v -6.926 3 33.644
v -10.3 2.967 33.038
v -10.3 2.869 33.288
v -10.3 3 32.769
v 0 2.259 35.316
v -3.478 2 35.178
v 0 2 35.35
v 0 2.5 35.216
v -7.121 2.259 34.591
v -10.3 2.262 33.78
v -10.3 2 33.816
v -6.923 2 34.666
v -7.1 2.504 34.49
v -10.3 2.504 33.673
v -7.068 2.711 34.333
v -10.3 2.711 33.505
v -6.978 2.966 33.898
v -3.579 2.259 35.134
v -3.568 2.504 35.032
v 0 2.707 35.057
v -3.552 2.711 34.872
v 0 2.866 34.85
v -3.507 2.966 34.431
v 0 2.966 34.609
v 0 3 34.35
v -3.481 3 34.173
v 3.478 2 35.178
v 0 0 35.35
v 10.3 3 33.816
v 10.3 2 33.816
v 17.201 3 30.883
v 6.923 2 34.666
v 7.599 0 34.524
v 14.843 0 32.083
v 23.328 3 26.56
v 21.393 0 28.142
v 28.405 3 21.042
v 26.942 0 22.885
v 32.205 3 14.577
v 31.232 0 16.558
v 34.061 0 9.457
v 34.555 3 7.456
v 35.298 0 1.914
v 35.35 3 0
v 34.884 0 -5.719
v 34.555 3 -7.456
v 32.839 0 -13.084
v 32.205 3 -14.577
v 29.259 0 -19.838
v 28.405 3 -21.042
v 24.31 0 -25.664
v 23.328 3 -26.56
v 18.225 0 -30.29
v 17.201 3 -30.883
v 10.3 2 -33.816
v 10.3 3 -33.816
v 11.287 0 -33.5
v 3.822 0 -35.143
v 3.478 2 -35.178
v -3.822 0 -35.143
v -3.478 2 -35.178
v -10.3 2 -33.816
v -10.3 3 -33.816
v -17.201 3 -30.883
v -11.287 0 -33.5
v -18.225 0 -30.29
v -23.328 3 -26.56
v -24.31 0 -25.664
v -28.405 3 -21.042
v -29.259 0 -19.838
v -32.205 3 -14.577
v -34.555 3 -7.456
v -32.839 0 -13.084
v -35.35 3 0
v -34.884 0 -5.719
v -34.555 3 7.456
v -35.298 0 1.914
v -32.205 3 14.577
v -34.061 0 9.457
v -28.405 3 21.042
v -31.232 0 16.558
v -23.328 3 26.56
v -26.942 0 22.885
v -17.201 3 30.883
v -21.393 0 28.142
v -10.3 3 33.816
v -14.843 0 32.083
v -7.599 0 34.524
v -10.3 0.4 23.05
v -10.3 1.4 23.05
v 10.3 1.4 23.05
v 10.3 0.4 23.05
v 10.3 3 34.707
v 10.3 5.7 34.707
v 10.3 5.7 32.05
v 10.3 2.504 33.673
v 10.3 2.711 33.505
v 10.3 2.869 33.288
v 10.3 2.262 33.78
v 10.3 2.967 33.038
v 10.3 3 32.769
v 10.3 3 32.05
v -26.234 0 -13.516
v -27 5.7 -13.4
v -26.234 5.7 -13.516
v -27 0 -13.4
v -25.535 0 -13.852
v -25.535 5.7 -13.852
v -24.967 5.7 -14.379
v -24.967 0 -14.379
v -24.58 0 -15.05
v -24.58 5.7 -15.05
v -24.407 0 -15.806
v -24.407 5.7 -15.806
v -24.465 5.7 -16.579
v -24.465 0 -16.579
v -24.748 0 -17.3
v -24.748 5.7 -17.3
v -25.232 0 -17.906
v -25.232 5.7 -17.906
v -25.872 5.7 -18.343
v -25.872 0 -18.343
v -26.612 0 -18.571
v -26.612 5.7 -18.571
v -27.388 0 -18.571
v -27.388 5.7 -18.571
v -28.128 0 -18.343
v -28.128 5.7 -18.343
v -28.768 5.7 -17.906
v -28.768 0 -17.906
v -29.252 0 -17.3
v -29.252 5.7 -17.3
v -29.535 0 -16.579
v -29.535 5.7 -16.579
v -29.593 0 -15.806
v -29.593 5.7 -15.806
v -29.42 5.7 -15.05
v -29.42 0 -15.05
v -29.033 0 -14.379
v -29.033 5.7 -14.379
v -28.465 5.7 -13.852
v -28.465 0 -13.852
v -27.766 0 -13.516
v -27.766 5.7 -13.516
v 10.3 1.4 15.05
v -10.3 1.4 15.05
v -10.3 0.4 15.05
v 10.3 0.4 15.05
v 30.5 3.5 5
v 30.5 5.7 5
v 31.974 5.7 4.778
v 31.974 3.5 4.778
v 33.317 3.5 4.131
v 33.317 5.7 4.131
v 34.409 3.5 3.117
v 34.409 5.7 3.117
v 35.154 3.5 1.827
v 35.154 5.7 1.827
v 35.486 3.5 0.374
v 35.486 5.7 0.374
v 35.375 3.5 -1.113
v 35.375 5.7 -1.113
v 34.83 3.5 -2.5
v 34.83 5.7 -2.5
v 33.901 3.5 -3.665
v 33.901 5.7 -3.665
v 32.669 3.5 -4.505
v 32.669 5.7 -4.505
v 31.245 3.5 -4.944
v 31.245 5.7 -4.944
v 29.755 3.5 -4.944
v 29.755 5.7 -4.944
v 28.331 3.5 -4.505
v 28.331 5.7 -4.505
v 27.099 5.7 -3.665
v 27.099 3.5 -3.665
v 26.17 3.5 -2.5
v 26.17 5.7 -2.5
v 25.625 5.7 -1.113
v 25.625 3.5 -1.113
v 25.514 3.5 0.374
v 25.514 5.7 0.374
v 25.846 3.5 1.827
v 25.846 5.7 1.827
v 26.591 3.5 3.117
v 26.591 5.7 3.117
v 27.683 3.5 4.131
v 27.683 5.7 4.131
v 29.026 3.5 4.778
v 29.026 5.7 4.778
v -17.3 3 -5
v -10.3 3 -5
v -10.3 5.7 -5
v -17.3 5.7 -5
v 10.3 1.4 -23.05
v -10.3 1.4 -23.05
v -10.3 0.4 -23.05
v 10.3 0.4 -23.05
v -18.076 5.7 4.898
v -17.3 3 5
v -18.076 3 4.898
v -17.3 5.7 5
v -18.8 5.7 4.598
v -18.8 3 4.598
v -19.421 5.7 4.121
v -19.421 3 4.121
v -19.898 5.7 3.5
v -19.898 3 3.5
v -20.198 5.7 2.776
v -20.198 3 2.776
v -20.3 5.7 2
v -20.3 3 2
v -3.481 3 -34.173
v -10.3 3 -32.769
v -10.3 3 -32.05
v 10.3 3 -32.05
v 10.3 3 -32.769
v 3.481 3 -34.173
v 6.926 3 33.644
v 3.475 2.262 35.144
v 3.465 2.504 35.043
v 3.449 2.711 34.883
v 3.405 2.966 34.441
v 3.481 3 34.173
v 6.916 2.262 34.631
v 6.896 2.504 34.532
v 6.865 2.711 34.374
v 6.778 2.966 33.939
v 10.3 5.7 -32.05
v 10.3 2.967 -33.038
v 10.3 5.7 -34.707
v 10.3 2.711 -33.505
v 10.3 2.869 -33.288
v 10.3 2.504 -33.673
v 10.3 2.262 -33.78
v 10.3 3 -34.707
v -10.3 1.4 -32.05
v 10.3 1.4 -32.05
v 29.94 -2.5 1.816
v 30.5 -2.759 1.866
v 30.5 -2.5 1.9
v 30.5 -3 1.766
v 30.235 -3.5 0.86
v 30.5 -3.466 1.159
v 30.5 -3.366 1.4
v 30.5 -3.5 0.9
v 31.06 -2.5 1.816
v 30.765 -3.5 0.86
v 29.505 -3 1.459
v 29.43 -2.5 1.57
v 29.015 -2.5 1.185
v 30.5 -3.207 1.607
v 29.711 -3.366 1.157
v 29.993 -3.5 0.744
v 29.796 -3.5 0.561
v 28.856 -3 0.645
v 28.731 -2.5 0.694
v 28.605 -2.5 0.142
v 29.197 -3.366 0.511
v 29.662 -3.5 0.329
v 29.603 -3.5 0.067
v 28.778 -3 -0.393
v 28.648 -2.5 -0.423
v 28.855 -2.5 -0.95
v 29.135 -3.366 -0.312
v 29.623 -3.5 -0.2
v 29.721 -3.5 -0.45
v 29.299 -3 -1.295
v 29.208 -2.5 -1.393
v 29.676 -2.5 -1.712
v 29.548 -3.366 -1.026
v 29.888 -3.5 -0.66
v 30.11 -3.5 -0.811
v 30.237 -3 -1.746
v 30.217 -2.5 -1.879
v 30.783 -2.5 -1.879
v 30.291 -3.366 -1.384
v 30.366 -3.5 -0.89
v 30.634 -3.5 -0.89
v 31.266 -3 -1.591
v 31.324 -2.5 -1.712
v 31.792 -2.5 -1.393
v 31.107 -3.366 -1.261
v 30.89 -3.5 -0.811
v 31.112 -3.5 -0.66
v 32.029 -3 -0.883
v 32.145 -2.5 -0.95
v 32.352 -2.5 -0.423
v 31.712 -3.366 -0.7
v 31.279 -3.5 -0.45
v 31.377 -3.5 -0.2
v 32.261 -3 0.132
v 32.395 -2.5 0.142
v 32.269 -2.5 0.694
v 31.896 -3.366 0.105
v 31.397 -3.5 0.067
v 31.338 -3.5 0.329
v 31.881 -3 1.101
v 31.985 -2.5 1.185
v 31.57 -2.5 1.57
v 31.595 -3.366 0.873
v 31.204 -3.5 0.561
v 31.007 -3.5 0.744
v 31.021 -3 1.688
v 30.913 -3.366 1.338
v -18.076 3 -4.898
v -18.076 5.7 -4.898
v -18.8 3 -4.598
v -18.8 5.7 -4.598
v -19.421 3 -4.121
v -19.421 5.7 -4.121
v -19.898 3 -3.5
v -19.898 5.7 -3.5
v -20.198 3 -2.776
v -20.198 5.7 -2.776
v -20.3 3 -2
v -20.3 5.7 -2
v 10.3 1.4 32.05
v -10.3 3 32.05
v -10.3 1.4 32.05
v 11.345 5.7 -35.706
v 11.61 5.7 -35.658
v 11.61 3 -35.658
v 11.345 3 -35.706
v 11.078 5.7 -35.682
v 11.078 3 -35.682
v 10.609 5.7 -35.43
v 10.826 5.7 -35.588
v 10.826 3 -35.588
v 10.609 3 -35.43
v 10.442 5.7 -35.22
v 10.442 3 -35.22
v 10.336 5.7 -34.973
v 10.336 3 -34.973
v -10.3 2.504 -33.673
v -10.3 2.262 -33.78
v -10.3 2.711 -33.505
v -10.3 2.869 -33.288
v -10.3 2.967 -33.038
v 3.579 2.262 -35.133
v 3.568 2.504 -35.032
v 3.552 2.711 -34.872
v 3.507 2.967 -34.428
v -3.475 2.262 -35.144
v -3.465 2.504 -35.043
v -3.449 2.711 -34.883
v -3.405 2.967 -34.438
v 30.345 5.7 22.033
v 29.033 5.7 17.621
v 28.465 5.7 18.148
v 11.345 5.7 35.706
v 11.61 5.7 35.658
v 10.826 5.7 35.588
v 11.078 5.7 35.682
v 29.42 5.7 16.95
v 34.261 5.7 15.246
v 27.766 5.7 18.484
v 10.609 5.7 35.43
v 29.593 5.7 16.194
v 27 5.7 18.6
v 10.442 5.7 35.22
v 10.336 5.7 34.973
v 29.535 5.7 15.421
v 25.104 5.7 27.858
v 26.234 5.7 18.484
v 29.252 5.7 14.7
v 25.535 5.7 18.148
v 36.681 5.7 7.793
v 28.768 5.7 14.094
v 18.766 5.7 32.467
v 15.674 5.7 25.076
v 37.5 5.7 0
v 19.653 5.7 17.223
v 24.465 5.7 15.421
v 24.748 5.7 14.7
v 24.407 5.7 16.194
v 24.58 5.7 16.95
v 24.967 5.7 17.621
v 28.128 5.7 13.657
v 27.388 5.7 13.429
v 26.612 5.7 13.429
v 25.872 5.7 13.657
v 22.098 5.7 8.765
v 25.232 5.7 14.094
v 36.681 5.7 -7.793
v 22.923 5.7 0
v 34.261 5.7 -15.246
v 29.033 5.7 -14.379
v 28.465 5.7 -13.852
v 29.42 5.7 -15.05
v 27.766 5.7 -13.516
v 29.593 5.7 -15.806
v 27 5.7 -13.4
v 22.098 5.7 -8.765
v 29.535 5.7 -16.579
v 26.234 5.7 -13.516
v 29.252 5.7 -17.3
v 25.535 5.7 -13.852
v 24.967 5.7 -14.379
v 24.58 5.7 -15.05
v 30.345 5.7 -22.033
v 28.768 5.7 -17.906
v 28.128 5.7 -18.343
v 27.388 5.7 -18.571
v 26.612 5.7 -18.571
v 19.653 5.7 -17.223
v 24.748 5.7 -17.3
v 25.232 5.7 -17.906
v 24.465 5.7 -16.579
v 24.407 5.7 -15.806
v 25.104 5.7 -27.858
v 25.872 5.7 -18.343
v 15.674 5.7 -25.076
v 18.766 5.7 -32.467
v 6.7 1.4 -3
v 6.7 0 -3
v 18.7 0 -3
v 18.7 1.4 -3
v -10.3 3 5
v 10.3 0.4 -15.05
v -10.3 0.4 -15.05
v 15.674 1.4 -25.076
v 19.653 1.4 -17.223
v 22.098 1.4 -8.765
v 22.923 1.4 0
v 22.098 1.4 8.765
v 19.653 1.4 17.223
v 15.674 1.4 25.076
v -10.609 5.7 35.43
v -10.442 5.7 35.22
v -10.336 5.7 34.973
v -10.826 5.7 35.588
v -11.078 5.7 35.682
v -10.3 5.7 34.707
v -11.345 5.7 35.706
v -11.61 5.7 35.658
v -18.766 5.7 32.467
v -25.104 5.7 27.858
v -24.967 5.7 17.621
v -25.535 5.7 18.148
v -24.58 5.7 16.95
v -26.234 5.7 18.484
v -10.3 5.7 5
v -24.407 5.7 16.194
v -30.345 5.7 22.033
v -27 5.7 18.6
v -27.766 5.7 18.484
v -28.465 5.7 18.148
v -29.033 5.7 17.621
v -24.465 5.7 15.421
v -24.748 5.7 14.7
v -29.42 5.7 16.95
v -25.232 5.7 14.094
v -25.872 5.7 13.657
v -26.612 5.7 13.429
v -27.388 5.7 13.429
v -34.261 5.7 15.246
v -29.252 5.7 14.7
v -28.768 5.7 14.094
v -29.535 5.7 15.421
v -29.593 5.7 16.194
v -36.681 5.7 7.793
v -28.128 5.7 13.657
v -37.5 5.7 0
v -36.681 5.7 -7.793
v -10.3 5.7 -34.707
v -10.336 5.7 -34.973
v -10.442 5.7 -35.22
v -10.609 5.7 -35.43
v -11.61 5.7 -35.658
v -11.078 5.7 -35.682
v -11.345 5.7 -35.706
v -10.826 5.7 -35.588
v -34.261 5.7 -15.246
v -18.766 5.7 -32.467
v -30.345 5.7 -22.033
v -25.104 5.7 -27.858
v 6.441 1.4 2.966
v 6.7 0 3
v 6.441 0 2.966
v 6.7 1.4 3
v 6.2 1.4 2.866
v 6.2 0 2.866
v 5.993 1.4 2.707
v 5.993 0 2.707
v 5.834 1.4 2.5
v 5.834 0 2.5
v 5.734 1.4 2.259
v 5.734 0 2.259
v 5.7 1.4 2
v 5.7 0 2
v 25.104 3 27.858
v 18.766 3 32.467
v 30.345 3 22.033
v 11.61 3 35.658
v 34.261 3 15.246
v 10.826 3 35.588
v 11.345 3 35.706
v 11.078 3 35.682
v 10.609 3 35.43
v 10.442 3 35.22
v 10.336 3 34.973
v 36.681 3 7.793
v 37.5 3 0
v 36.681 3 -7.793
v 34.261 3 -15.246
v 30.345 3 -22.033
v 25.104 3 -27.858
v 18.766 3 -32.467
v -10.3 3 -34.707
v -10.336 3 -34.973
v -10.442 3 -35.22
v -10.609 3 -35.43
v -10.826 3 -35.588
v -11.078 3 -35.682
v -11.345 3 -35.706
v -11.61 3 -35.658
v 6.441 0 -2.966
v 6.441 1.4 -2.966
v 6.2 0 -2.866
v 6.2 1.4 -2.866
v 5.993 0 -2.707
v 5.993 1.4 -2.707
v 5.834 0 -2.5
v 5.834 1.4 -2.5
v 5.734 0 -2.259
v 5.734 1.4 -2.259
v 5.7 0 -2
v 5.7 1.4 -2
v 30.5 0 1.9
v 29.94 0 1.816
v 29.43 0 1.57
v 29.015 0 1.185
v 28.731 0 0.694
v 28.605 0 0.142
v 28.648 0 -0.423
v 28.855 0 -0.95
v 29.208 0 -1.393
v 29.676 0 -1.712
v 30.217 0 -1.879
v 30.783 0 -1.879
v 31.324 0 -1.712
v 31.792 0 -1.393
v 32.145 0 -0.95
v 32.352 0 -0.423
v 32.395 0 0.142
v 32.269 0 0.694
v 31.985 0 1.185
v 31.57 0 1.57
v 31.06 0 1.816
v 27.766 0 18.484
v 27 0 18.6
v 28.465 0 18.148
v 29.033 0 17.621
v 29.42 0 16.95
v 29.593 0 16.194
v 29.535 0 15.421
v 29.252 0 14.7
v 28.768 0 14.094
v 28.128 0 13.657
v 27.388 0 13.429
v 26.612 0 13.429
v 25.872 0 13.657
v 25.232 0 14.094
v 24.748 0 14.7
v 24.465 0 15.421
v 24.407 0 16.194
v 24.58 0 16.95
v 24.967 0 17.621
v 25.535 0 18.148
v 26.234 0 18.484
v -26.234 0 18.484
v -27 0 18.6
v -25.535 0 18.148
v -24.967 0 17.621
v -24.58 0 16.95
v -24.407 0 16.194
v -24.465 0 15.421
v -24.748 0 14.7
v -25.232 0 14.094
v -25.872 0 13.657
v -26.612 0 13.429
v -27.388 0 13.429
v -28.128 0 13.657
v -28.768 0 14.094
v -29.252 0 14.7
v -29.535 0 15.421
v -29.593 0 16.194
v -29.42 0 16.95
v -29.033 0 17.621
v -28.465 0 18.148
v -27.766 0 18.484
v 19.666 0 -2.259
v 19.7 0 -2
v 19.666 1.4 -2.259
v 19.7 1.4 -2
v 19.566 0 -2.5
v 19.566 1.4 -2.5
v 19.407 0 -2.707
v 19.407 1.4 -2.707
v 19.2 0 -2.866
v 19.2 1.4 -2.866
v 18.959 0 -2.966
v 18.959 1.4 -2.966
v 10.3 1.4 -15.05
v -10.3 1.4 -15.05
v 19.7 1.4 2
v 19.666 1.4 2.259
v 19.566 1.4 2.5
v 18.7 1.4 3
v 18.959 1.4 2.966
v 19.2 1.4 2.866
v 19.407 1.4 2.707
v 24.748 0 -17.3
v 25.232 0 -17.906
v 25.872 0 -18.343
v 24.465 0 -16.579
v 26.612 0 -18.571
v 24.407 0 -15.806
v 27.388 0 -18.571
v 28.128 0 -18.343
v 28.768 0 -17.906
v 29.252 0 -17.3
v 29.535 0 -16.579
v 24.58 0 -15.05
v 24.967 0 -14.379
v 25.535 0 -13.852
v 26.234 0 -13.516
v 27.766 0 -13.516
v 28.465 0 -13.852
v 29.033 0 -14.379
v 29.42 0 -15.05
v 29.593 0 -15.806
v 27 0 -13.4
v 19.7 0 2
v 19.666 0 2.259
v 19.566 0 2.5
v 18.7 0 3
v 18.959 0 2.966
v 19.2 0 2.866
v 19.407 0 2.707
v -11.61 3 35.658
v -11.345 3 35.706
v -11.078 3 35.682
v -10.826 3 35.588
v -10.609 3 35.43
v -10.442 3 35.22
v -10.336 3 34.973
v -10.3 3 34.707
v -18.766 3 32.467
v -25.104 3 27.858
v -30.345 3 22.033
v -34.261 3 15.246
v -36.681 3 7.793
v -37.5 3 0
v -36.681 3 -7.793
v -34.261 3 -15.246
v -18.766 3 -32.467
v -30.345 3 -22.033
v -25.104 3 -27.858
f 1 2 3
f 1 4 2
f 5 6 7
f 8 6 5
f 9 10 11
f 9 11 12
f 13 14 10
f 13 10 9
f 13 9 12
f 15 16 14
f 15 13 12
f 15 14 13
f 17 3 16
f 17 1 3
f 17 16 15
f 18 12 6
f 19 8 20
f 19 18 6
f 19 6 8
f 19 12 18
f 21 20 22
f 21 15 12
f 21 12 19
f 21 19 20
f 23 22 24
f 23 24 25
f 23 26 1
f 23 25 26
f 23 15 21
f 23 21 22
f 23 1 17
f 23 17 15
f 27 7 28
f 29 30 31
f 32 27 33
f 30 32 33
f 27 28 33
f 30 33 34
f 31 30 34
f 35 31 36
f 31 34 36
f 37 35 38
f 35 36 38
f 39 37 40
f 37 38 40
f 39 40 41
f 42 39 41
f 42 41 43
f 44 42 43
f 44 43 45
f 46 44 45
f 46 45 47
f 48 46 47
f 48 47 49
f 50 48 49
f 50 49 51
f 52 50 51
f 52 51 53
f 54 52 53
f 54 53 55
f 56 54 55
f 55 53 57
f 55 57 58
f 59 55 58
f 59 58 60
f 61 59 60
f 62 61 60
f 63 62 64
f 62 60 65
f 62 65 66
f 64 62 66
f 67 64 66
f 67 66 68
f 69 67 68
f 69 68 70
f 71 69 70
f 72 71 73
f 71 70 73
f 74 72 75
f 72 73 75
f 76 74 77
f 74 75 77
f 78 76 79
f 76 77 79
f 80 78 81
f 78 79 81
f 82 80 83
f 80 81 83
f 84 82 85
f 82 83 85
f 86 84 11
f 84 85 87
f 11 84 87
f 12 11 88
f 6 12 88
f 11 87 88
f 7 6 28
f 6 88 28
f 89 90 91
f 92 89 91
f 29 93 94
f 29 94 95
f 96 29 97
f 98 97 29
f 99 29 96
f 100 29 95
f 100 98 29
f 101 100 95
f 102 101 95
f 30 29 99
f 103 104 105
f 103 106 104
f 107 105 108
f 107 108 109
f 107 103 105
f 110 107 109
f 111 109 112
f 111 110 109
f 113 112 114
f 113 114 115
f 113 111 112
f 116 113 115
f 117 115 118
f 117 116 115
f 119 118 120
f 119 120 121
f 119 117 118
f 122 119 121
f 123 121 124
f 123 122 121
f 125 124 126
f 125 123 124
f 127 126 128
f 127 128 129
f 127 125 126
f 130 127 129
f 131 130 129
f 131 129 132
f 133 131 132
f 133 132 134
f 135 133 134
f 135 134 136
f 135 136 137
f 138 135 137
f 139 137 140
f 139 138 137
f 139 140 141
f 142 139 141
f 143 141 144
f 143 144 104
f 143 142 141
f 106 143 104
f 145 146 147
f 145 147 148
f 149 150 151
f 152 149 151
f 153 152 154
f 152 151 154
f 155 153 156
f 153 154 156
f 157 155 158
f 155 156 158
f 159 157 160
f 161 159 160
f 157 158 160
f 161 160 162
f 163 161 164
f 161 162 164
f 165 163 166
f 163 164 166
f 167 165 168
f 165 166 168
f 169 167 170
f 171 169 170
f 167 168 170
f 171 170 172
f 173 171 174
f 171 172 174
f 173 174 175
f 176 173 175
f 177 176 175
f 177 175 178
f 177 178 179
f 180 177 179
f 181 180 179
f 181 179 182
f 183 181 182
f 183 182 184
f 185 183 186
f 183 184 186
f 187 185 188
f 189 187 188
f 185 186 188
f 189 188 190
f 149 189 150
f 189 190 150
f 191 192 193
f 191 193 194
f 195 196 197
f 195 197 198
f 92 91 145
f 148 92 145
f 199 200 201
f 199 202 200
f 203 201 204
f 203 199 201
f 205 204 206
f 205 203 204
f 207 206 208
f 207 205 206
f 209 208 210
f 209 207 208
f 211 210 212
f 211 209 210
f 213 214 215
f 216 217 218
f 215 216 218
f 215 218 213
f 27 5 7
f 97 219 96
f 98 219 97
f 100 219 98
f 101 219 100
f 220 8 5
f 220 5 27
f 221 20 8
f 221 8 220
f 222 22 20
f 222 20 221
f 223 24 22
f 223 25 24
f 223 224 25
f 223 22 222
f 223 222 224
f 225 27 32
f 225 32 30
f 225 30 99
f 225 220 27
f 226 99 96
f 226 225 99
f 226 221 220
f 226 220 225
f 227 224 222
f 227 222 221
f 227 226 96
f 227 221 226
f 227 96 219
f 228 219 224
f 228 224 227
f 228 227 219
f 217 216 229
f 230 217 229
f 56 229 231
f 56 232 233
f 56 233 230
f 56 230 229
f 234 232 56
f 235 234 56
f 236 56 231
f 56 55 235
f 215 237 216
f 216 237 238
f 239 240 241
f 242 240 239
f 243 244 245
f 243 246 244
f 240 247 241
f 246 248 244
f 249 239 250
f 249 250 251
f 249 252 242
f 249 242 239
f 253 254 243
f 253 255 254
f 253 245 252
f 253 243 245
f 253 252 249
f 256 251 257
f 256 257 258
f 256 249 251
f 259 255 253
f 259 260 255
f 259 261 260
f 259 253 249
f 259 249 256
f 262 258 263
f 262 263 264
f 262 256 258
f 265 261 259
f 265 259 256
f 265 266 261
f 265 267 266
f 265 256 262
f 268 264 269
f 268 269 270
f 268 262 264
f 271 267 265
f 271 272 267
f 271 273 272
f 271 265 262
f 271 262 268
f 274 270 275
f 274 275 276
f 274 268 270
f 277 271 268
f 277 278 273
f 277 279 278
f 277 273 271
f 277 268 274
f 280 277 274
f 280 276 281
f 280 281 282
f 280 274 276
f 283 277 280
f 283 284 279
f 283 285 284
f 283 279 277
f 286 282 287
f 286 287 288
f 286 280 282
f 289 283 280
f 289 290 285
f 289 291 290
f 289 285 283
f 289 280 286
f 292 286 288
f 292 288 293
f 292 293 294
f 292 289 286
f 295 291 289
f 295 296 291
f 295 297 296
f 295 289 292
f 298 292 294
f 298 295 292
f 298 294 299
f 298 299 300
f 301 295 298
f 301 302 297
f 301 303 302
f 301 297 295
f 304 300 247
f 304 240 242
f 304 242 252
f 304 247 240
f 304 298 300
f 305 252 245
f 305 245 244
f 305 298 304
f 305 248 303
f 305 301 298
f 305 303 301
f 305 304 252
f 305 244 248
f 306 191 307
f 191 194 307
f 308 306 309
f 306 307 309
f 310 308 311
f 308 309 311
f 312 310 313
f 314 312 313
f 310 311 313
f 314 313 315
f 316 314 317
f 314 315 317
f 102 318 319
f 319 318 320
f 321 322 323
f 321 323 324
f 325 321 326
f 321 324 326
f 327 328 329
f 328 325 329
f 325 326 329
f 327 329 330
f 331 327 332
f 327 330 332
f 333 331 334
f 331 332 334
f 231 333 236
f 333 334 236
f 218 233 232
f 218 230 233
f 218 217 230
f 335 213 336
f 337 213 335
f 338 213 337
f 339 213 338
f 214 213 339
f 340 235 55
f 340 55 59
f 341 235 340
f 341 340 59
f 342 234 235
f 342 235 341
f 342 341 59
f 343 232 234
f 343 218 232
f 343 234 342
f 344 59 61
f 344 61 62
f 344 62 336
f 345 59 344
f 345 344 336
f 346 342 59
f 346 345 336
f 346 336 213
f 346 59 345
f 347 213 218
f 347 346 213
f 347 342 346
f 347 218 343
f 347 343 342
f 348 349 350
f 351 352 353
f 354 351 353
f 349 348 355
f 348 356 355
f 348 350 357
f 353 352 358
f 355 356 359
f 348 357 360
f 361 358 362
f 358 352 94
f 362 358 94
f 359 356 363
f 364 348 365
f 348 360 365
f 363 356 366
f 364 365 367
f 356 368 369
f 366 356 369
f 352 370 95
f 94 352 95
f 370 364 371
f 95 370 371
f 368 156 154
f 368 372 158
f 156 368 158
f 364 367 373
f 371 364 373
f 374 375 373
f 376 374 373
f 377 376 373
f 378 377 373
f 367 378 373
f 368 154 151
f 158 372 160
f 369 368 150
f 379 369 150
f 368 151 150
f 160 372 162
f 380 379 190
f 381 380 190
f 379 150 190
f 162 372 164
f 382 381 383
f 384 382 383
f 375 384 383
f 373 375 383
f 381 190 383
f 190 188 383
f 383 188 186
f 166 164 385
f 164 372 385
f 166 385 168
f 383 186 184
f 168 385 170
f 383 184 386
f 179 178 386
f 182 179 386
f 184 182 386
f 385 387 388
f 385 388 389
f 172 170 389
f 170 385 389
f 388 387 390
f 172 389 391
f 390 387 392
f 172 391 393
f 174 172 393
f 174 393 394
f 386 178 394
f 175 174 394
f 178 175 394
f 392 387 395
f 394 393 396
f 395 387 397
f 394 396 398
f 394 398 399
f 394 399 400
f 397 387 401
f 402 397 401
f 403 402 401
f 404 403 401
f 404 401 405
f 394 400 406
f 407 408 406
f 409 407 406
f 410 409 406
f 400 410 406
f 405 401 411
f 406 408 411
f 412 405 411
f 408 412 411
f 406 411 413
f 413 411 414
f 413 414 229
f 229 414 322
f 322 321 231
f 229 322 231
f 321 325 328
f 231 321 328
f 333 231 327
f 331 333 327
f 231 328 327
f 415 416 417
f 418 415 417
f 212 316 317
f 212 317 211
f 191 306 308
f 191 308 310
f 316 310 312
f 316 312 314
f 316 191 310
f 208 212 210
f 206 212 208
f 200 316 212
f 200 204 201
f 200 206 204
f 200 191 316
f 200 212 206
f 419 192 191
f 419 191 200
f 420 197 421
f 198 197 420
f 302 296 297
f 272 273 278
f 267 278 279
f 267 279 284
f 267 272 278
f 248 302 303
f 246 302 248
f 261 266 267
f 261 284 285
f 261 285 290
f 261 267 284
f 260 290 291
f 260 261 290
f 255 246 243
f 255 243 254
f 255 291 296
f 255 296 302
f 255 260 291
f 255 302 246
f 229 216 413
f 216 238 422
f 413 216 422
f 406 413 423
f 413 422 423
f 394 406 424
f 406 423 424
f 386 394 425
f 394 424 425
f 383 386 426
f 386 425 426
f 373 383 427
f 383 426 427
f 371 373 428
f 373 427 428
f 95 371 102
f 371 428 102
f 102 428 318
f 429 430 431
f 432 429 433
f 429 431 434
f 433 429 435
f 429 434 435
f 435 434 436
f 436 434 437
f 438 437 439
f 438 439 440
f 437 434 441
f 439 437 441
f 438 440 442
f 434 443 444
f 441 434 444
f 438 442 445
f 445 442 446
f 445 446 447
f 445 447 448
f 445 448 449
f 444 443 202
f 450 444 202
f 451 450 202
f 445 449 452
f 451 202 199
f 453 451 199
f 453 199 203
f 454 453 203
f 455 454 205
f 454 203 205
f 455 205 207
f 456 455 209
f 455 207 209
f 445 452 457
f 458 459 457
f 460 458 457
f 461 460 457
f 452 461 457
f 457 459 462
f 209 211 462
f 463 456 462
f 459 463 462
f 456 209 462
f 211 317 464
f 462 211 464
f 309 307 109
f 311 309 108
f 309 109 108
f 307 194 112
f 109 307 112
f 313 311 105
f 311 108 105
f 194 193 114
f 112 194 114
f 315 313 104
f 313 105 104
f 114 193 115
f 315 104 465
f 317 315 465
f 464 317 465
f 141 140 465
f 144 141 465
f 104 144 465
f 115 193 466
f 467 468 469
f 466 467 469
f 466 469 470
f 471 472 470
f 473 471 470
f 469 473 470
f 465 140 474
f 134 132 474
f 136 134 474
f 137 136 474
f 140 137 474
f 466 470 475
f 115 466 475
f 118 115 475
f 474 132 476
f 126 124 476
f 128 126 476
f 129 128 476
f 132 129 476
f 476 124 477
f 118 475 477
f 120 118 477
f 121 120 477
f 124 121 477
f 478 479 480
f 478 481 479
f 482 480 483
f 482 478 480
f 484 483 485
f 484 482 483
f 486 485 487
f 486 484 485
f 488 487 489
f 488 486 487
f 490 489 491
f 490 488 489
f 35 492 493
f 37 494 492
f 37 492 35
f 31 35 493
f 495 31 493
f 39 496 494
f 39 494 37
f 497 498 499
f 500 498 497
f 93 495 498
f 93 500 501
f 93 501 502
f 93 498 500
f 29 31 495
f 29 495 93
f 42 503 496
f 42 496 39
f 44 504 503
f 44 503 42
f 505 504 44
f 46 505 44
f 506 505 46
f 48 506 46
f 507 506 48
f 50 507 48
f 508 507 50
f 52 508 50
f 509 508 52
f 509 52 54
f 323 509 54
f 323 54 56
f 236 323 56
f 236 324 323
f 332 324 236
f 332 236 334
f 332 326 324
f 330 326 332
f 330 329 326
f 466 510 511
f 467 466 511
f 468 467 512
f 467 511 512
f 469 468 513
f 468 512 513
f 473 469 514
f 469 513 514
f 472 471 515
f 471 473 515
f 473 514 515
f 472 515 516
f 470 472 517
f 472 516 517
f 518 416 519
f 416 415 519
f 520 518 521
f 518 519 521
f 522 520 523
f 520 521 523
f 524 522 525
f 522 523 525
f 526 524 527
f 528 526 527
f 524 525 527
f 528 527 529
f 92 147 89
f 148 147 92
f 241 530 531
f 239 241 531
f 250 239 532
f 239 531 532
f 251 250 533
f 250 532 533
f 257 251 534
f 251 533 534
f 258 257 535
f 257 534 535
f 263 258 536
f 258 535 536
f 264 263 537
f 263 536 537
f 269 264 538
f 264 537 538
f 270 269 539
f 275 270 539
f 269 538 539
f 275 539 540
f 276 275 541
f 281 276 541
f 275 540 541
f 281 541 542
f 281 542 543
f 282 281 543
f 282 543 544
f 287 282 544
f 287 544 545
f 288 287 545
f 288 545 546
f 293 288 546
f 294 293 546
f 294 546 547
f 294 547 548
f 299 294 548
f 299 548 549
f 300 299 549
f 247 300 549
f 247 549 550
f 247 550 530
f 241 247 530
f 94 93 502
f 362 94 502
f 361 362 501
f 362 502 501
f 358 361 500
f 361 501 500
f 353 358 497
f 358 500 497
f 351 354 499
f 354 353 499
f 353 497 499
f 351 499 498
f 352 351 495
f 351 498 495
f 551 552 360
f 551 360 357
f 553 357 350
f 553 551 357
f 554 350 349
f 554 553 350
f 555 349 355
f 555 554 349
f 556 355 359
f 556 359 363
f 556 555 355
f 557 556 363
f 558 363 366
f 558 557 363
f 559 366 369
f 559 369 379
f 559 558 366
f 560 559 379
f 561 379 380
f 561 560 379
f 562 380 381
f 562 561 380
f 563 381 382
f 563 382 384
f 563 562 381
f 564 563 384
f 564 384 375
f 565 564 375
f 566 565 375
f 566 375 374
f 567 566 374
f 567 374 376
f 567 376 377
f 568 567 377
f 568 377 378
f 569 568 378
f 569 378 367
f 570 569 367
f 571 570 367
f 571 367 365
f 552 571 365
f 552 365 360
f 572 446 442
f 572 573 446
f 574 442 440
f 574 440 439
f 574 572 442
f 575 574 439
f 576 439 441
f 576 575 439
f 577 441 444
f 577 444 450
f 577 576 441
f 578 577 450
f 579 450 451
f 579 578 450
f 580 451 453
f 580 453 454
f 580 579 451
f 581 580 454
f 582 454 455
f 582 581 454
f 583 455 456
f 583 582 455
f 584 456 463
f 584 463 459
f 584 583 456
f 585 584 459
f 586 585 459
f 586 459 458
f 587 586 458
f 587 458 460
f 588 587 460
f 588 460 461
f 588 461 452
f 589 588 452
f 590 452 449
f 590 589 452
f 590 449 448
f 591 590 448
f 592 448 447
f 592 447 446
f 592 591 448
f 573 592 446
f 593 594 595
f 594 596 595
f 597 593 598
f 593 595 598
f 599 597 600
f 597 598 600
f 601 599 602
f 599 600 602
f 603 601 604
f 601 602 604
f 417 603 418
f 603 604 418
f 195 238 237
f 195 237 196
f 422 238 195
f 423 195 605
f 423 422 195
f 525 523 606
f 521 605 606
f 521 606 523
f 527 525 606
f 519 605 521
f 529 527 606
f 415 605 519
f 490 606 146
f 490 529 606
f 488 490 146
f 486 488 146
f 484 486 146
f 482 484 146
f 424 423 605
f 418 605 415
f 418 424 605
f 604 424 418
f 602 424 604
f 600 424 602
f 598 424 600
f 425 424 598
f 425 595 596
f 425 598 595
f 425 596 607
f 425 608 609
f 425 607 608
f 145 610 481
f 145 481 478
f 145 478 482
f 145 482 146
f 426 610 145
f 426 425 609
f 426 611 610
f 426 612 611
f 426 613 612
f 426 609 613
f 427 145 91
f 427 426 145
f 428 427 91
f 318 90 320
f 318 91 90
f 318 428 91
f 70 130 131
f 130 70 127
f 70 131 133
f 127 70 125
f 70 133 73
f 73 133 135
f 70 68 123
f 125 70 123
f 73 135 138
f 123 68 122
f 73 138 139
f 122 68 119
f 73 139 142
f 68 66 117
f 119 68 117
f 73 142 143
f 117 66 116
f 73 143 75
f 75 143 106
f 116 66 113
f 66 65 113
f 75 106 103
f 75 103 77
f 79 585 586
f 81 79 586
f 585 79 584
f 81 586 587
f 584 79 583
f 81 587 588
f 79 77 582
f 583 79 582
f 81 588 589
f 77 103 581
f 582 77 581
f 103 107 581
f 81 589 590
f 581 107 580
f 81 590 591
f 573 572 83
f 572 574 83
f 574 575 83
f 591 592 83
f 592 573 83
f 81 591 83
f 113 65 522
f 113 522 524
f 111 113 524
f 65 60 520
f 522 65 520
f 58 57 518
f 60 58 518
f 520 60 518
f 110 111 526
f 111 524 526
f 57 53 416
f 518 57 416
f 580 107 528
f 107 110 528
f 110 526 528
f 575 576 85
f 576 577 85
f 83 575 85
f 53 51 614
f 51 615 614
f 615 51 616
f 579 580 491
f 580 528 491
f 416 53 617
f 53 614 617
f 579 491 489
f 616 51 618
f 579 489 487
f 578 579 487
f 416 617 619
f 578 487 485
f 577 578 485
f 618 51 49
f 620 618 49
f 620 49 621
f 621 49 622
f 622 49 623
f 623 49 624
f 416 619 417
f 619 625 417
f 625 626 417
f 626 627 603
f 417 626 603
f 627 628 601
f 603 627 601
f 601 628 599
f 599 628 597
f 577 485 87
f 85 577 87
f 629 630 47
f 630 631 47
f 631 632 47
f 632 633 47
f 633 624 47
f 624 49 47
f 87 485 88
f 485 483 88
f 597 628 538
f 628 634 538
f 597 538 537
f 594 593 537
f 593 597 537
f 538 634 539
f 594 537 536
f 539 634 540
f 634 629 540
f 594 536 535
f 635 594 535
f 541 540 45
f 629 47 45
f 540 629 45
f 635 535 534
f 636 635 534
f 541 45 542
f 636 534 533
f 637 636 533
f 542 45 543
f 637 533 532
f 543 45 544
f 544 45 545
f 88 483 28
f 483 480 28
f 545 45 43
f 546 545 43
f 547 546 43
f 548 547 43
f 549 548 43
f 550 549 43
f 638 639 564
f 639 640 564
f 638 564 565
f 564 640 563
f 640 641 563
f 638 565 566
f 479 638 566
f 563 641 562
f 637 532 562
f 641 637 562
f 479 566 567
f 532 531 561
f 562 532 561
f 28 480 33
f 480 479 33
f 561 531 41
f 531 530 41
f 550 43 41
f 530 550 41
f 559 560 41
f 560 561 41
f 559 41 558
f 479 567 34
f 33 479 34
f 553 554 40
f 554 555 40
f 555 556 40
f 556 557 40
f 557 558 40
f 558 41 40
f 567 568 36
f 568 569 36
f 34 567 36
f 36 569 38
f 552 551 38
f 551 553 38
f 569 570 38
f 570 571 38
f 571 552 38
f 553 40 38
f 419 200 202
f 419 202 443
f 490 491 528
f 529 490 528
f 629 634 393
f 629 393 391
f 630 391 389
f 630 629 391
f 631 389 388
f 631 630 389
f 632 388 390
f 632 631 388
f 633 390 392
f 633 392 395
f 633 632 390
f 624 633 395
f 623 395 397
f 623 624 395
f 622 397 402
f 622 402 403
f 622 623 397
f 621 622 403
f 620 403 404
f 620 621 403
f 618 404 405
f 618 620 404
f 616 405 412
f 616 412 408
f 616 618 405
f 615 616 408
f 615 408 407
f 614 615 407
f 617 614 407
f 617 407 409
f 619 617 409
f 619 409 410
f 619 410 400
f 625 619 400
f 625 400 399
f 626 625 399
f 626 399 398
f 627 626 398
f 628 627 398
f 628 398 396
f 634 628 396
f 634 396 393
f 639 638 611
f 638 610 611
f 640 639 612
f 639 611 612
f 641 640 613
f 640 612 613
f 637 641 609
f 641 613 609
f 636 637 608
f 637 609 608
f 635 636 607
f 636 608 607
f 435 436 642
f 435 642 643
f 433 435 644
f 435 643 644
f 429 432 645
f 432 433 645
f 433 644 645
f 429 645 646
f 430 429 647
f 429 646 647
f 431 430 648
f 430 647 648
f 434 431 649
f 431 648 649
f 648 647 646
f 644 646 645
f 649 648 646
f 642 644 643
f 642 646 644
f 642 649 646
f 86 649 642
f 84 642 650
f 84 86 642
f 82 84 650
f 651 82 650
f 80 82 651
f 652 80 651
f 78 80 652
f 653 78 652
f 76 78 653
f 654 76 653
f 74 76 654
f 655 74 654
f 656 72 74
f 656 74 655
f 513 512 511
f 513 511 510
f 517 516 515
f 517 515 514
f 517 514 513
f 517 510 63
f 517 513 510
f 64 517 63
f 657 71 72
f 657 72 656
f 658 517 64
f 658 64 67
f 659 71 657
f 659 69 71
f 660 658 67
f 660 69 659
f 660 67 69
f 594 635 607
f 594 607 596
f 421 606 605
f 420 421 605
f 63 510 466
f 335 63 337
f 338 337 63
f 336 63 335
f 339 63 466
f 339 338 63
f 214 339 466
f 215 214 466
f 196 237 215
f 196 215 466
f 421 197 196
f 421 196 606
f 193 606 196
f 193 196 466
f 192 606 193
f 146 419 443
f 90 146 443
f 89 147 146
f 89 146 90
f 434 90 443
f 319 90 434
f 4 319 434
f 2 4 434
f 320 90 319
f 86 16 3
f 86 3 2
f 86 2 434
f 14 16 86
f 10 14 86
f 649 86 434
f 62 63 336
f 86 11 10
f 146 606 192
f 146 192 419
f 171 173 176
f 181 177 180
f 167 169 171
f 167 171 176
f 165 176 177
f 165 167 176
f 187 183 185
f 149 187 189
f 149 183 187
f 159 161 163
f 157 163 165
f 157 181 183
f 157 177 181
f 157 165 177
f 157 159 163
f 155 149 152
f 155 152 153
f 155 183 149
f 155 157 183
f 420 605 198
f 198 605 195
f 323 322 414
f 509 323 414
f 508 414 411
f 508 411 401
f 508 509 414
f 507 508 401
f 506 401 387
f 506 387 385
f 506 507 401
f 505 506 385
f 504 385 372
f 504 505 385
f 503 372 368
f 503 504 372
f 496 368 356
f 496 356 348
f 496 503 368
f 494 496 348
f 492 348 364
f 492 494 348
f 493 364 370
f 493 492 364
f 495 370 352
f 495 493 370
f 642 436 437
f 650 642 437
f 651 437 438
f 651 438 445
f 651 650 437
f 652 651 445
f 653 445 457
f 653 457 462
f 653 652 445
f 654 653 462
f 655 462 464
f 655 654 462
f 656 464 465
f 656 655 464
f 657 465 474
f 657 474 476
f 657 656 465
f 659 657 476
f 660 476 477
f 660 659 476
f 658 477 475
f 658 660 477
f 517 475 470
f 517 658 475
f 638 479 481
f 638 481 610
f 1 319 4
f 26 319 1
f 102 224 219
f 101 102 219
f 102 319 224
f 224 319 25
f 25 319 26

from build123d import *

# Parameters (mm, degrees)
SKETCH1_R           = 35.35
SKETCH1_R_2         = 2.6
SKETCH1_W           = 14
SKETCH1_H           = 6
BOSS_EXTRUDE1_DEPTH = 1.4
FILLET1_R           = 1
SKETCH3_R           = 35.35
SKETCH3_R_2         = 2.6
BOSS_EXTRUDE3_DEPTH = 1.6
SKETCH4_R           = 2.6
BOSS_EXTRUDE4_DEPTH = 2.7
SKETCH5_R           = 5
CUT_EXTRUDE1_DEPTH  = 2.2
SKETCH7_W           = 20.6
SKETCH7_H           = 8
CUT_EXTRUDE3_DEPTH  = 1
SKETCH8_R           = 1.9
BOSS_EXTRUDE6_DEPTH = 3.5
FILLET2_R           = 1
FILLET3_R           = 3


with BuildPart() as part:
    # Sketch1 → Boss-Extrude1 (new body)
    with BuildSketch(Plane(origin=(0, 0, 0), x_dir=(1, 0, 0), z_dir=(0, 1, 0))):
        with Locations(Location((0, 0, 0), (0, 0, 270))):
            Circle(SKETCH1_R)
        with Locations(Location((27, 16, 0), (0, 0, 270))):
            Circle(SKETCH1_R_2, mode=Mode.SUBTRACT)
        with Locations(Location((-27, 16, 0), (0, 0, 270))):
            Circle(SKETCH1_R_2, mode=Mode.SUBTRACT)
        with Locations(Location((-27, -16, 0), (0, 0, 270))):
            Circle(SKETCH1_R_2, mode=Mode.SUBTRACT)
        with Locations(Location((27, -16, 0), (0, 0, 270))):
            Circle(SKETCH1_R_2, mode=Mode.SUBTRACT)
        with Locations((12.7, 0)):
            Rectangle(SKETCH1_W, SKETCH1_H, mode=Mode.SUBTRACT)
    extrude(amount=BOSS_EXTRUDE1_DEPTH)

    # Fillet1
    fillet1_edges = [part.edges().sort_by_distance(p)[0] for p in [
        (5.7, 0.7, -3),
        (5.7, 0.7, 3),
        (19.7, 0.7, 3),
        (19.7, 0.7, -3),
    ]]
    fillet(fillet1_edges, radius=FILLET1_R)

    # Sketch3 → Boss-Extrude3 (add)
    with BuildSketch(Plane(origin=(0, 1.4, 0), x_dir=(1, 0, 0), z_dir=(0, 1, 0))):
        with Locations(Location((0, 0, 0), (0, 0, 270))):
            Circle(SKETCH3_R)
        with Locations(Location((27, 16, 0), (0, 0, 270))):
            Circle(SKETCH3_R_2, mode=Mode.SUBTRACT)
        with Locations(Location((27, -16, 0), (0, 0, 270))):
            Circle(SKETCH3_R_2, mode=Mode.SUBTRACT)
        with Locations(Location((-27, -16, 0), (0, 0, 270))):
            Circle(SKETCH3_R_2, mode=Mode.SUBTRACT)
        with Locations(Location((-27, 16, 0), (0, 0, 270))):
            Circle(SKETCH3_R_2, mode=Mode.SUBTRACT)
        with BuildLine():
            Line((-10.3, 32.05), (10.3, 32.05))
            ThreePointArc((10.3, 32.05), (22.922718258, 0), (10.3, -32.05))
            Line((10.3, -32.05), (-10.3, -32.05))
            Line((-10.3, -32.05), (-10.3, 32.05))
        make_face(mode=Mode.SUBTRACT)
    extrude(amount=BOSS_EXTRUDE3_DEPTH)

    # Sketch4 → Boss-Extrude4 (add)
    # profile 1 of 2: a face of its own
    with BuildSketch(Plane(origin=(0, 3, 0), x_dir=(1, 0, 0), z_dir=(0, 1, 0))):
        with BuildLine():
            Line((-10.3, 36.057731487), (-10.3, 5))
            Line((-10.3, 5), (-20.3, 5))
            Line((-20.3, 5), (-20.3, -5))
            Line((-20.3, -5), (-10.3, -5))
            Line((-10.3, -5), (-10.3, -36.057731487))
            ThreePointArc((-10.3, -36.057731487), (-37.5, 0), (-10.3, 36.057731487))
        make_face()
        with Locations(Location((-27, 16, 0), (0, 0, 270))):
            Circle(SKETCH4_R, mode=Mode.SUBTRACT)
        with Locations(Location((-27, -16, 0), (0, 0, 270))):
            Circle(SKETCH4_R, mode=Mode.SUBTRACT)
    # profile 2 of 2: a face of its own
    with BuildSketch(Plane(origin=(0, 3, 0), x_dir=(1, 0, 0), z_dir=(0, 1, 0))):
        with BuildLine():
            Line((10.3, 32.05), (10.3, 36.057731487))
            ThreePointArc((10.3, 36.057731487), (37.5, 0), (10.3, -36.057731487))
            Line((10.3, -36.057731487), (10.3, -32.05))
            ThreePointArc((10.3, -32.05), (22.922718258, 0), (10.3, 32.05))
        make_face()
        with Locations(Location((27, -16, 0), (0, 0, 270))):
            Circle(SKETCH4_R, mode=Mode.SUBTRACT)
        with Locations(Location((27, 16, 0), (0, 0, 270))):
            Circle(SKETCH4_R, mode=Mode.SUBTRACT)
    extrude(amount=BOSS_EXTRUDE4_DEPTH)

    # Sketch5 → Cut-Extrude1 (cut)
    with BuildSketch(Plane(origin=(0, 5.7, 0), x_dir=(1, 0, 0), z_dir=(0, 1, 0))):
        with Locations(Location((30.5, 0, 0), (0, 0, 270))):
            Circle(SKETCH5_R)
    extrude(amount=-CUT_EXTRUDE1_DEPTH, mode=Mode.SUBTRACT)

    # Sketch7 → Cut-Extrude3 (cut)
    with BuildSketch(Plane(origin=(0, 1.4, 0), x_dir=(1, 0, 0), z_dir=(0, 1, 0))):
        with Locations((0, -19.05)):
            Rectangle(SKETCH7_W, SKETCH7_H)
        with Locations((0, 19.05)):
            Rectangle(SKETCH7_W, SKETCH7_H)
    extrude(amount=-CUT_EXTRUDE3_DEPTH, mode=Mode.SUBTRACT)

    # Sketch8 → Boss-Extrude6 (add)
    with BuildSketch(Plane.XZ):
        with Locations(Location((30.5, 0, 0), (0, 0, 90))):
            Circle(SKETCH8_R)
    extrude(amount=BOSS_EXTRUDE6_DEPTH)

    # Fillet2
    # the kernel refuses this fillet: 1 mm, written as the material it takes off along each edge
    with BuildSketch(Plane(origin=(0, 3, 0), x_dir=(0, 0, 1), z_dir=(-1, 0, 0))) as fillet2_piece_1_section:
        with BuildLine():
            CenterArc((35.35 - FILLET2_R, -FILLET2_R), FILLET2_R, 0, 90)
            Line((35.35 - FILLET2_R, 0), (35.35, 0))
            Line((35.35, 0), (35.35, -FILLET2_R))
        make_face()
    fillet2_piece_1 = revolve(axis=Axis((0, 3, 0), (0, 1, 0)), revolution_arc=20.992206164, mode=Mode.PRIVATE)
    fillet2_piece_1 = split(fillet2_piece_1, bisect_by=Plane(origin=(10.3, 2.776649723, 34.610378642), z_dir=(-1, 0, 0)), keep=Keep.TOP, mode=Mode.PRIVATE)
    add(fillet2_piece_1, mode=Mode.SUBTRACT)
    with BuildSketch(Plane(origin=(-10.3, -0.42335266, -36.057731487), x_dir=(0, 0, 1), z_dir=(0, 1, 0)), Plane(origin=(10.3, -0.42335266, 36.057731487), x_dir=(0, 0, -1), z_dir=(0, 1, 0))) as fillet2_piece_2:
        with BuildLine():
            CenterArc((1.350959814, -1), FILLET2_R, 90, 108.034465952)
            ThreePointArc((0.400089357, -1.309589041), (0.1940666, -0.656620869), (0, 0))
            Line((0, 0), (1.350959814, 0))
        make_face()
    extrude(amount=9.546705321, mode=Mode.SUBTRACT)
    with BuildSketch(Plane(origin=(-10.3, -0.42335266, 36.057731487), x_dir=(0, 0, -1), z_dir=(0, 1, 0)), Plane(origin=(10.3, -0.42335266, -36.057731487), x_dir=(0, 0, 1), z_dir=(0, 1, 0))) as fillet2_piece_3:
        with BuildLine():
            CenterArc((1.350959814, 1), FILLET2_R, 161.965534048, 108.034465952)
            ThreePointArc((0.400089357, 1.309589041), (0.1940666, 0.656620869), (0, 0))
            Line((0, 0), (1.350959814, 0))
        make_face()
    extrude(amount=9.546705321, mode=Mode.SUBTRACT)
    with BuildSketch(Plane(origin=(30.5, -3.5, 0), x_dir=(0, 0, 1), z_dir=(1, 0, 0))) as fillet2_piece_4:
        with BuildLine():
            CenterArc((1.9 - FILLET2_R, -FILLET2_R), FILLET2_R, 0, 90)
            Line((1.9 - FILLET2_R, 0), (1.9, 0))
            Line((1.9, 0), (1.9, -FILLET2_R))
        make_face()
    revolve(axis=Axis((30.5, -3.5, 0), (0, -1, 0)), mode=Mode.SUBTRACT)
    with BuildSketch(Plane(origin=(0, 3, 0), x_dir=(0.3582437714618883, 0, -0.9336280845222912), z_dir=(0.9336280845222912, 0, 0.3582437714618883))) as fillet2_piece_5_section:
        with BuildLine():
            CenterArc((35.35 - FILLET2_R, -FILLET2_R), FILLET2_R, 0, 90)
            Line((35.35 - FILLET2_R, 0), (35.35, 0))
            Line((35.35, 0), (35.35, -FILLET2_R))
        make_face()
    fillet2_piece_5 = revolve(axis=Axis((0, 3, 0), (0, 1, 0)), revolution_arc=41.984758253, mode=Mode.PRIVATE)
    fillet2_piece_5 = split(fillet2_piece_5, bisect_by=Plane(origin=(-10.3, 2.718769388, -35.068769388), z_dir=(1, 0, 0)), keep=Keep.TOP, mode=Mode.PRIVATE)
    fillet2_piece_5 = split(fillet2_piece_5, bisect_by=Plane(origin=(10.3, 2.718769388, -35.068769388), z_dir=(-1, 0, 0)), keep=Keep.TOP, mode=Mode.PRIVATE)
    add(fillet2_piece_5, mode=Mode.SUBTRACT)
    with BuildSketch(Plane(origin=(0, 3, 0), x_dir=(-0.35824095305440445, 0, 0.9336291659725889), z_dir=(-0.9336291659725889, 0, -0.35824095305440445))) as fillet2_piece_6_section:
        with BuildLine():
            CenterArc((35.35 - FILLET2_R, -FILLET2_R), FILLET2_R, 0, 90)
            Line((35.35 - FILLET2_R, 0), (35.35, 0))
            Line((35.35, 0), (35.35, -FILLET2_R))
        make_face()
    fillet2_piece_6 = revolve(axis=Axis((0, 3, 0), (0, 1, 0)), revolution_arc=20.992206164, mode=Mode.PRIVATE)
    fillet2_piece_6 = split(fillet2_piece_6, bisect_by=Plane(origin=(-10.3, 2.776650175, 34.610378573), z_dir=(1, 0, 0)), keep=Keep.TOP, mode=Mode.PRIVATE)
    add(fillet2_piece_6, mode=Mode.SUBTRACT)

    # Fillet3
    fillet3_edges = [part.edges().sort_by_distance(p)[0] for p in [
        (-20.3, 4.35, 5),
        (-20.3, 4.35, -5),
    ]]
    fillet(fillet3_edges, radius=FILLET3_R)


solid = part.part
